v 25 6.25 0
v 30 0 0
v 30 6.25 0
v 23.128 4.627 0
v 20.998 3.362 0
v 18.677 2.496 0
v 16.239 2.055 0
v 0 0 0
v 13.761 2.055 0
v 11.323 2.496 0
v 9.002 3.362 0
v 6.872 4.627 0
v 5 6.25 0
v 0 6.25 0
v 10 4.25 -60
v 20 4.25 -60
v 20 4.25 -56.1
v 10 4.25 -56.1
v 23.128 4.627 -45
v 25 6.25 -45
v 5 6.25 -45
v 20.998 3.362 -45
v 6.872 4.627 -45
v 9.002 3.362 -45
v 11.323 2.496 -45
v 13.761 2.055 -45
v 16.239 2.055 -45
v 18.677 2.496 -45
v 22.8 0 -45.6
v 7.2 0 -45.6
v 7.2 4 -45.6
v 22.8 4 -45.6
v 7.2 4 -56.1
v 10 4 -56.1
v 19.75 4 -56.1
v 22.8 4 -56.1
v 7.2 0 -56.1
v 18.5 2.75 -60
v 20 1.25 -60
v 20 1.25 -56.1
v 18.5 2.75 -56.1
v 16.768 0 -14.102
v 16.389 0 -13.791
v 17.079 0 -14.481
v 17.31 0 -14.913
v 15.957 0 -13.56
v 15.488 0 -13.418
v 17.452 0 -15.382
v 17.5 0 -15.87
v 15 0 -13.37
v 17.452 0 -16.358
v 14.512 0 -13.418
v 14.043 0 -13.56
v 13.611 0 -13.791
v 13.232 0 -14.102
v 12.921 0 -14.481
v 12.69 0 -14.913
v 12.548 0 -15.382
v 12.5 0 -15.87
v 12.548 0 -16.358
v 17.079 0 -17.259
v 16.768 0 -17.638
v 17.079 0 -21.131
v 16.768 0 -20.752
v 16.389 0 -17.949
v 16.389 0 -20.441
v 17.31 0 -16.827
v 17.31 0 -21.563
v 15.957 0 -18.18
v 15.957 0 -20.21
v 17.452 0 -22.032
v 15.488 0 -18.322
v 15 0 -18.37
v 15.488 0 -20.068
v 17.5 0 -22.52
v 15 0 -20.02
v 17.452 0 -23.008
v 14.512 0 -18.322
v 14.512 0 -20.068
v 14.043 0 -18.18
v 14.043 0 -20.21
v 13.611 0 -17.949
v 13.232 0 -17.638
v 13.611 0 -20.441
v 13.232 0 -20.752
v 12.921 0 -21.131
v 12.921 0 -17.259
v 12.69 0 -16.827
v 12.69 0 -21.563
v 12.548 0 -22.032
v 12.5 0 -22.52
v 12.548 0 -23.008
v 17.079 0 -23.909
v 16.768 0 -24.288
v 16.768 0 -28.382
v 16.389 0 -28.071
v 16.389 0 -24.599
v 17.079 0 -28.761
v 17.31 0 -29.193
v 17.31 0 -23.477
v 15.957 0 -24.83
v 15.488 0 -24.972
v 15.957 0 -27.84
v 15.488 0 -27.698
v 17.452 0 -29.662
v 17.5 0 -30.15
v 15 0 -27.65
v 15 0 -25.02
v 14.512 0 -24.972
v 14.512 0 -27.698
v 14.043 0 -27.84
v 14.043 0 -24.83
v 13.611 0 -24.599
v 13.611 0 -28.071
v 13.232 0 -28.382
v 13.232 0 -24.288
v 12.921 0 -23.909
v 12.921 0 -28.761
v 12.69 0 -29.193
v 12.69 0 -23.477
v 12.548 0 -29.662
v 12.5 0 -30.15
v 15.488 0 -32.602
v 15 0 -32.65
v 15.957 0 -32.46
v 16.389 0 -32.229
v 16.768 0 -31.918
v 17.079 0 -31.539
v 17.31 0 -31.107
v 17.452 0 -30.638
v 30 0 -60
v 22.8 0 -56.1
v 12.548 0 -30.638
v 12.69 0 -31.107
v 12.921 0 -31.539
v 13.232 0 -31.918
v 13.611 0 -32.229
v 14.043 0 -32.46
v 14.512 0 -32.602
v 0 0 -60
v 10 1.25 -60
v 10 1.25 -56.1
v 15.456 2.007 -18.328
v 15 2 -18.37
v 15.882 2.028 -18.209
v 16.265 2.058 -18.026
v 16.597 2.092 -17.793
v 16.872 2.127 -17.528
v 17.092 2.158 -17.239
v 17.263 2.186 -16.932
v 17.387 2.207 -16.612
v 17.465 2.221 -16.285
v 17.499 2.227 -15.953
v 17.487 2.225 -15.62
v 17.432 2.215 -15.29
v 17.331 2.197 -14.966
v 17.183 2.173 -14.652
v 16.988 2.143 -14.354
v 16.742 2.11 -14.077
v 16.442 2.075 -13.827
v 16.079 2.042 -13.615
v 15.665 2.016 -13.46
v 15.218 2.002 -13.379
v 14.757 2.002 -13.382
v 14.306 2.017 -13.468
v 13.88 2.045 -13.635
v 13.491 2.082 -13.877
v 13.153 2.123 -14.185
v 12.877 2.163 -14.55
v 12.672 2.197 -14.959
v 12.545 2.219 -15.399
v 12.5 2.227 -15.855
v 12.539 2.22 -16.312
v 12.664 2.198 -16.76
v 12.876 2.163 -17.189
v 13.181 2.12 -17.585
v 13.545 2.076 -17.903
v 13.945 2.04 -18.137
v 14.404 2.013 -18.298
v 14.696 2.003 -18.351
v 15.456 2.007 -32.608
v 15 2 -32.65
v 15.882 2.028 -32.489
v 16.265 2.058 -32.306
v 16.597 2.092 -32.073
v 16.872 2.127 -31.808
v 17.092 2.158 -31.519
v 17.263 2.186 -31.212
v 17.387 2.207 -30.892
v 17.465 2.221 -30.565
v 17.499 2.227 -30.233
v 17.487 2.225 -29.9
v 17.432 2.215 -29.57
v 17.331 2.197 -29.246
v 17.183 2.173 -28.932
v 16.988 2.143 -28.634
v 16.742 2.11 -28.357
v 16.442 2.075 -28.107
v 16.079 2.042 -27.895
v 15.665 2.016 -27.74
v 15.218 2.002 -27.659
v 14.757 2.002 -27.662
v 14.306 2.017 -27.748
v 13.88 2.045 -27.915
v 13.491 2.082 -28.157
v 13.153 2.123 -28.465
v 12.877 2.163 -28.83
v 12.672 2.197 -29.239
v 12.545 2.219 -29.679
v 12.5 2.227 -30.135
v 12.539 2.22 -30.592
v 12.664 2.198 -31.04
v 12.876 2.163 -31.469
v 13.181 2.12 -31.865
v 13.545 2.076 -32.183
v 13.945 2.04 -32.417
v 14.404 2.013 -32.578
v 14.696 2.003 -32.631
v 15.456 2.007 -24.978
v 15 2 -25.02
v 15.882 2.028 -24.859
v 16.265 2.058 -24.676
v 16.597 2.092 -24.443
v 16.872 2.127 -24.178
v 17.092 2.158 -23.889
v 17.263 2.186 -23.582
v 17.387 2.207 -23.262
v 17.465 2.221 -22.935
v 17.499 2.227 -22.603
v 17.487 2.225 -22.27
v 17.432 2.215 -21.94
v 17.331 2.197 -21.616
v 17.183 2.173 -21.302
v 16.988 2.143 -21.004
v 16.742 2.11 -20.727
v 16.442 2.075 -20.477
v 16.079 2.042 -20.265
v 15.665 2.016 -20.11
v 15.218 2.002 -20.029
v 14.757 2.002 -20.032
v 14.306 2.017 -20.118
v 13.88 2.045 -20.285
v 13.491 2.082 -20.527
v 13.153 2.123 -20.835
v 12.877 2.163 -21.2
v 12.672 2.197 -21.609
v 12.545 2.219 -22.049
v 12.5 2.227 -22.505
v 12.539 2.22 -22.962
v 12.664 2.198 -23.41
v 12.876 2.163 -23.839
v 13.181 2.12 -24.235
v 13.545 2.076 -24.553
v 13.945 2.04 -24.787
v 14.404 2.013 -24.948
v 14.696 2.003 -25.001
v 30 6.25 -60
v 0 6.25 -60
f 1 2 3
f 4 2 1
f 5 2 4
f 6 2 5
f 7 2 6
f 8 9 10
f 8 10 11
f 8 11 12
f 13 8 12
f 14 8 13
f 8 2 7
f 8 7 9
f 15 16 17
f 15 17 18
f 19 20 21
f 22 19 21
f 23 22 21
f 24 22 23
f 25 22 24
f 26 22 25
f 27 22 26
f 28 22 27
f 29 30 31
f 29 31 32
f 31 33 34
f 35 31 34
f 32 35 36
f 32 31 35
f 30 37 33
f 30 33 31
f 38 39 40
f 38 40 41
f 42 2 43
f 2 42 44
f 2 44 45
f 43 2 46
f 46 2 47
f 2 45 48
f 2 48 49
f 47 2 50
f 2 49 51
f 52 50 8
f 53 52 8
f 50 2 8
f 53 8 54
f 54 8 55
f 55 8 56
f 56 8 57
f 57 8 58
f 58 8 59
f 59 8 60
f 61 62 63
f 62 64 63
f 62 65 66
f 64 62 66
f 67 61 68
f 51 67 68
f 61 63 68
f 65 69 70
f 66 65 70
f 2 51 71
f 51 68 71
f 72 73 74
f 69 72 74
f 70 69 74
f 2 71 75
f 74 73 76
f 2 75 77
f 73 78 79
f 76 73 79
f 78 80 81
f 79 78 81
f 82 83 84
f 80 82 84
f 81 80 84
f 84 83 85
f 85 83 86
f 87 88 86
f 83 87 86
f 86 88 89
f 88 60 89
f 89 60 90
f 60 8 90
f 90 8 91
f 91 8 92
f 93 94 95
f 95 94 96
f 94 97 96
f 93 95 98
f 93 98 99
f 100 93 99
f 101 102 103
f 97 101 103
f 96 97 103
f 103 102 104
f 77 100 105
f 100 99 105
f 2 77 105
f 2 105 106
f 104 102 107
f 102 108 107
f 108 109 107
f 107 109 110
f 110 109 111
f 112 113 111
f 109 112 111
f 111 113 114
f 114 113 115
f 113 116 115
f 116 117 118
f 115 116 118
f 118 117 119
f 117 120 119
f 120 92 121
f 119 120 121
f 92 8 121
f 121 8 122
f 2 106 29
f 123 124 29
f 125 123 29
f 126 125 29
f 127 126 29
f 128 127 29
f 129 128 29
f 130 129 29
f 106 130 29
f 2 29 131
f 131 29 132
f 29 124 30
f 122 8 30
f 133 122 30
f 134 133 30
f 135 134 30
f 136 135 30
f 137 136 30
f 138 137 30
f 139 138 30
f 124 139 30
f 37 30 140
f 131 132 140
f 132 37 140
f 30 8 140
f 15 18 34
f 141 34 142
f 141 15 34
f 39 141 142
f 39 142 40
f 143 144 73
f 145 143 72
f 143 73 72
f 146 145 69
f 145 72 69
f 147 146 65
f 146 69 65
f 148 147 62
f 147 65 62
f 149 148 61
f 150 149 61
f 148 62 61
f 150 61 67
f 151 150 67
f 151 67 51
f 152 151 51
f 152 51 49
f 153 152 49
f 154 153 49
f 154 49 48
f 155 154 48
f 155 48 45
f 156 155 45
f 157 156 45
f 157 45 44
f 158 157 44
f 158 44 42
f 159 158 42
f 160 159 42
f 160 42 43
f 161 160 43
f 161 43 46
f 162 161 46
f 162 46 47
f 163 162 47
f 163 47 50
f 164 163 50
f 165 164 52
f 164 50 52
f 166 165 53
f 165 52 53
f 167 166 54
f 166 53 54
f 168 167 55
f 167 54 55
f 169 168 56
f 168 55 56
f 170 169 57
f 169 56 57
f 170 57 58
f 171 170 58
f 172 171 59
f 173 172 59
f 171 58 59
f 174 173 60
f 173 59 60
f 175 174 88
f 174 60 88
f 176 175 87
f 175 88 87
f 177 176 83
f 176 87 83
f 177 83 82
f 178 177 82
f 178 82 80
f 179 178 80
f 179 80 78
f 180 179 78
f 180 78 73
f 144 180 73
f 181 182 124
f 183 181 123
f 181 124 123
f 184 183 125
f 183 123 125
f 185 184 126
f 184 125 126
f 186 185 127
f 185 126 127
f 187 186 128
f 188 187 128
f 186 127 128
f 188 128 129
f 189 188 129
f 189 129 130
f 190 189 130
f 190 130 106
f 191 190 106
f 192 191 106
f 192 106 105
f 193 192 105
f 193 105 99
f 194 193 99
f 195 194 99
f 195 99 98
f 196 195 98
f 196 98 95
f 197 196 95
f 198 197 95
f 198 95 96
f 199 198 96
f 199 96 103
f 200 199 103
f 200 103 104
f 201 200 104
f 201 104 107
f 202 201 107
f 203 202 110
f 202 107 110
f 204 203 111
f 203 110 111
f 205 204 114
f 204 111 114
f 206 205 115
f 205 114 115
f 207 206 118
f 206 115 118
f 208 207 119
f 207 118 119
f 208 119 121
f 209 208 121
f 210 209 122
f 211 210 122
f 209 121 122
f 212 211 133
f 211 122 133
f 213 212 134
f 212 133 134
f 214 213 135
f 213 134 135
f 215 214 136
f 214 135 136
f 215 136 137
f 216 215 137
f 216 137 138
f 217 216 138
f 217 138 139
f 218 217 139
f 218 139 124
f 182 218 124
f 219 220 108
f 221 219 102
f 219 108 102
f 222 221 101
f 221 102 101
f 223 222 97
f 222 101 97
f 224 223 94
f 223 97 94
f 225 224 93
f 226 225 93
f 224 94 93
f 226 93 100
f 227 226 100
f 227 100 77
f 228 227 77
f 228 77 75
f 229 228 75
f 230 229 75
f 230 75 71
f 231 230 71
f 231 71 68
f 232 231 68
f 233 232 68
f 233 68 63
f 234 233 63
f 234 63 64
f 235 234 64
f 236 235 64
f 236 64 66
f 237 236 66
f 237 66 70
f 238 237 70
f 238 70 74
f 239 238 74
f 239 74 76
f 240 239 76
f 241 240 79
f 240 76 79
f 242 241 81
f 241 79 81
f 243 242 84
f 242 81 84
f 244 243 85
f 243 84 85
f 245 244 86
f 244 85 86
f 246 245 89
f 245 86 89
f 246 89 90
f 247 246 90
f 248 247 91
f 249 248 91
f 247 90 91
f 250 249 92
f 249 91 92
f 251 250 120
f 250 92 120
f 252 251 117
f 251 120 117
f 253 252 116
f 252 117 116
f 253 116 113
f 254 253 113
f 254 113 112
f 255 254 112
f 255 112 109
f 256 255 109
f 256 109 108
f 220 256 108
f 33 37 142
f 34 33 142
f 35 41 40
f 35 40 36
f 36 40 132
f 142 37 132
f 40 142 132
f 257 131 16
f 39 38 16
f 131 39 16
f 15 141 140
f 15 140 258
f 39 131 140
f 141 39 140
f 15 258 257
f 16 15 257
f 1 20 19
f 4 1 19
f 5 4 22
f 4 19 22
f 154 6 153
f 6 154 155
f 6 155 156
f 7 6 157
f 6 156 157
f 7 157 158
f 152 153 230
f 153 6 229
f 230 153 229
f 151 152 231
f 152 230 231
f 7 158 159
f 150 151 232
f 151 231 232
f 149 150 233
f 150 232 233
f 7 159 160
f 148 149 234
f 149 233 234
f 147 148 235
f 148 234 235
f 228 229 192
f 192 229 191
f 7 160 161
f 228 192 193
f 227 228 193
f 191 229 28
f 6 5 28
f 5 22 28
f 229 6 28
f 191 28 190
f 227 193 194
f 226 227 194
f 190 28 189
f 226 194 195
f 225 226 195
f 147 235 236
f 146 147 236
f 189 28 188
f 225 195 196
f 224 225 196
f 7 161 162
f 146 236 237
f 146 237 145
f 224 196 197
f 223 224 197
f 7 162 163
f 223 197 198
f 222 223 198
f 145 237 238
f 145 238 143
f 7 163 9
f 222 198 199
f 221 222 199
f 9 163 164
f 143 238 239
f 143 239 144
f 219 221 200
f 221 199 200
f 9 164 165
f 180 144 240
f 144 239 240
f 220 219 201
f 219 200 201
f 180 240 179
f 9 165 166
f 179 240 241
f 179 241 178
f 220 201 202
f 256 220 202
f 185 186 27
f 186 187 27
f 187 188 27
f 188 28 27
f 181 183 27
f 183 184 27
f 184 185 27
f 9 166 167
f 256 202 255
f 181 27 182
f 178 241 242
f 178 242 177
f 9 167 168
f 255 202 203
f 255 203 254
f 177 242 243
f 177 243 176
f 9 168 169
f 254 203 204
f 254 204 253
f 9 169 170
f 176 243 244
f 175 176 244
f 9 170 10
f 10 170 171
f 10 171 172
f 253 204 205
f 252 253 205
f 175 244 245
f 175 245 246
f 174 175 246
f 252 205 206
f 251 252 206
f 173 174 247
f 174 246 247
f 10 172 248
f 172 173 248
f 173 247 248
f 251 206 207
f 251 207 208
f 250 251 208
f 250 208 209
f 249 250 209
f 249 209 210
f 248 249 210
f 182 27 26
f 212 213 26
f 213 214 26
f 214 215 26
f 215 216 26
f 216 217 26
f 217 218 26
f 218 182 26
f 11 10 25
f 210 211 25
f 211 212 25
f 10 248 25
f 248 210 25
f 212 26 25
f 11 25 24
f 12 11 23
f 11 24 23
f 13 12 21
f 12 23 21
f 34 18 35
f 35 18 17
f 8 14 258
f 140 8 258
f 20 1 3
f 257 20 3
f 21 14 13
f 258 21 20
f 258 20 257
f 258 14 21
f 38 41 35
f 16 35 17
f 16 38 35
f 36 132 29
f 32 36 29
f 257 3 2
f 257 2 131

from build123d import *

# Parameters (mm, degrees)
SKETCH1_W               = 60
SKETCH1_H               = 6.25
BOSS_EXTRUDE1_DEPTH     = 30
CUT_EXTRUDE1_DEPTH      = 68.372564891
CUT_EXTRUDE1_DEPTH_BACK = 45
SKETCH4_R               = 2.5
SKETCH4_W               = 15.6
SKETCH4_H               = 10.5
CUT_EXTRUDE2_DEPTH      = 4
CUT_EXTRUDE3_DEPTH      = 3.9


with BuildPart() as part:
    # Sketch1 → Boss-Extrude1 (new body)
    with BuildSketch(Plane(origin=(0, 0, 0), x_dir=(0, 0, -1), z_dir=(1, 0, 0))):
        with Locations((30, 3.125)):
            Rectangle(SKETCH1_W, SKETCH1_H)
    extrude(amount=BOSS_EXTRUDE1_DEPTH)

    # Sketch2 → Cut-Extrude1 (cut, two sides: drawn at the far end of the back side and taken through both)
    with BuildSketch(Plane.XY.offset(-CUT_EXTRUDE1_DEPTH_BACK)):
        with BuildLine():
            Line((5, 6.25), (25, 6.25))
            ThreePointArc((25, 6.25), (15, 2), (5, 6.25))
        make_face()
    extrude(amount=CUT_EXTRUDE1_DEPTH + CUT_EXTRUDE1_DEPTH_BACK, mode=Mode.SUBTRACT)

    # Sketch4 → Cut-Extrude2 (cut)
    with BuildSketch(Plane.XZ):
        with Locations(Location((15, -15.87, 0), (0, 0, 270))):
            Circle(SKETCH4_R)
        with Locations(Location((15, -22.52, 0), (0, 0, 270))):
            Circle(SKETCH4_R)
        with Locations(Location((15, -30.15, 0), (0, 0, 270))):
            Circle(SKETCH4_R)
        with Locations((15, -50.85)):
            Rectangle(SKETCH4_W, SKETCH4_H)
    extrude(amount=-CUT_EXTRUDE2_DEPTH, mode=Mode.SUBTRACT)

    # Sketch5 → Cut-Extrude3 (cut)
    with BuildSketch(Plane(origin=(0, 0, -60), x_dir=(-1, 0, 0), z_dir=(0, 0, -1))):
        Polygon((-10, 1.25), (-20, 1.25), (-18.5, 2.75), (-20, 4.25), (-10, 4.25), align=None)
    extrude(amount=-CUT_EXTRUDE3_DEPTH, mode=Mode.SUBTRACT)


solid = part.part
